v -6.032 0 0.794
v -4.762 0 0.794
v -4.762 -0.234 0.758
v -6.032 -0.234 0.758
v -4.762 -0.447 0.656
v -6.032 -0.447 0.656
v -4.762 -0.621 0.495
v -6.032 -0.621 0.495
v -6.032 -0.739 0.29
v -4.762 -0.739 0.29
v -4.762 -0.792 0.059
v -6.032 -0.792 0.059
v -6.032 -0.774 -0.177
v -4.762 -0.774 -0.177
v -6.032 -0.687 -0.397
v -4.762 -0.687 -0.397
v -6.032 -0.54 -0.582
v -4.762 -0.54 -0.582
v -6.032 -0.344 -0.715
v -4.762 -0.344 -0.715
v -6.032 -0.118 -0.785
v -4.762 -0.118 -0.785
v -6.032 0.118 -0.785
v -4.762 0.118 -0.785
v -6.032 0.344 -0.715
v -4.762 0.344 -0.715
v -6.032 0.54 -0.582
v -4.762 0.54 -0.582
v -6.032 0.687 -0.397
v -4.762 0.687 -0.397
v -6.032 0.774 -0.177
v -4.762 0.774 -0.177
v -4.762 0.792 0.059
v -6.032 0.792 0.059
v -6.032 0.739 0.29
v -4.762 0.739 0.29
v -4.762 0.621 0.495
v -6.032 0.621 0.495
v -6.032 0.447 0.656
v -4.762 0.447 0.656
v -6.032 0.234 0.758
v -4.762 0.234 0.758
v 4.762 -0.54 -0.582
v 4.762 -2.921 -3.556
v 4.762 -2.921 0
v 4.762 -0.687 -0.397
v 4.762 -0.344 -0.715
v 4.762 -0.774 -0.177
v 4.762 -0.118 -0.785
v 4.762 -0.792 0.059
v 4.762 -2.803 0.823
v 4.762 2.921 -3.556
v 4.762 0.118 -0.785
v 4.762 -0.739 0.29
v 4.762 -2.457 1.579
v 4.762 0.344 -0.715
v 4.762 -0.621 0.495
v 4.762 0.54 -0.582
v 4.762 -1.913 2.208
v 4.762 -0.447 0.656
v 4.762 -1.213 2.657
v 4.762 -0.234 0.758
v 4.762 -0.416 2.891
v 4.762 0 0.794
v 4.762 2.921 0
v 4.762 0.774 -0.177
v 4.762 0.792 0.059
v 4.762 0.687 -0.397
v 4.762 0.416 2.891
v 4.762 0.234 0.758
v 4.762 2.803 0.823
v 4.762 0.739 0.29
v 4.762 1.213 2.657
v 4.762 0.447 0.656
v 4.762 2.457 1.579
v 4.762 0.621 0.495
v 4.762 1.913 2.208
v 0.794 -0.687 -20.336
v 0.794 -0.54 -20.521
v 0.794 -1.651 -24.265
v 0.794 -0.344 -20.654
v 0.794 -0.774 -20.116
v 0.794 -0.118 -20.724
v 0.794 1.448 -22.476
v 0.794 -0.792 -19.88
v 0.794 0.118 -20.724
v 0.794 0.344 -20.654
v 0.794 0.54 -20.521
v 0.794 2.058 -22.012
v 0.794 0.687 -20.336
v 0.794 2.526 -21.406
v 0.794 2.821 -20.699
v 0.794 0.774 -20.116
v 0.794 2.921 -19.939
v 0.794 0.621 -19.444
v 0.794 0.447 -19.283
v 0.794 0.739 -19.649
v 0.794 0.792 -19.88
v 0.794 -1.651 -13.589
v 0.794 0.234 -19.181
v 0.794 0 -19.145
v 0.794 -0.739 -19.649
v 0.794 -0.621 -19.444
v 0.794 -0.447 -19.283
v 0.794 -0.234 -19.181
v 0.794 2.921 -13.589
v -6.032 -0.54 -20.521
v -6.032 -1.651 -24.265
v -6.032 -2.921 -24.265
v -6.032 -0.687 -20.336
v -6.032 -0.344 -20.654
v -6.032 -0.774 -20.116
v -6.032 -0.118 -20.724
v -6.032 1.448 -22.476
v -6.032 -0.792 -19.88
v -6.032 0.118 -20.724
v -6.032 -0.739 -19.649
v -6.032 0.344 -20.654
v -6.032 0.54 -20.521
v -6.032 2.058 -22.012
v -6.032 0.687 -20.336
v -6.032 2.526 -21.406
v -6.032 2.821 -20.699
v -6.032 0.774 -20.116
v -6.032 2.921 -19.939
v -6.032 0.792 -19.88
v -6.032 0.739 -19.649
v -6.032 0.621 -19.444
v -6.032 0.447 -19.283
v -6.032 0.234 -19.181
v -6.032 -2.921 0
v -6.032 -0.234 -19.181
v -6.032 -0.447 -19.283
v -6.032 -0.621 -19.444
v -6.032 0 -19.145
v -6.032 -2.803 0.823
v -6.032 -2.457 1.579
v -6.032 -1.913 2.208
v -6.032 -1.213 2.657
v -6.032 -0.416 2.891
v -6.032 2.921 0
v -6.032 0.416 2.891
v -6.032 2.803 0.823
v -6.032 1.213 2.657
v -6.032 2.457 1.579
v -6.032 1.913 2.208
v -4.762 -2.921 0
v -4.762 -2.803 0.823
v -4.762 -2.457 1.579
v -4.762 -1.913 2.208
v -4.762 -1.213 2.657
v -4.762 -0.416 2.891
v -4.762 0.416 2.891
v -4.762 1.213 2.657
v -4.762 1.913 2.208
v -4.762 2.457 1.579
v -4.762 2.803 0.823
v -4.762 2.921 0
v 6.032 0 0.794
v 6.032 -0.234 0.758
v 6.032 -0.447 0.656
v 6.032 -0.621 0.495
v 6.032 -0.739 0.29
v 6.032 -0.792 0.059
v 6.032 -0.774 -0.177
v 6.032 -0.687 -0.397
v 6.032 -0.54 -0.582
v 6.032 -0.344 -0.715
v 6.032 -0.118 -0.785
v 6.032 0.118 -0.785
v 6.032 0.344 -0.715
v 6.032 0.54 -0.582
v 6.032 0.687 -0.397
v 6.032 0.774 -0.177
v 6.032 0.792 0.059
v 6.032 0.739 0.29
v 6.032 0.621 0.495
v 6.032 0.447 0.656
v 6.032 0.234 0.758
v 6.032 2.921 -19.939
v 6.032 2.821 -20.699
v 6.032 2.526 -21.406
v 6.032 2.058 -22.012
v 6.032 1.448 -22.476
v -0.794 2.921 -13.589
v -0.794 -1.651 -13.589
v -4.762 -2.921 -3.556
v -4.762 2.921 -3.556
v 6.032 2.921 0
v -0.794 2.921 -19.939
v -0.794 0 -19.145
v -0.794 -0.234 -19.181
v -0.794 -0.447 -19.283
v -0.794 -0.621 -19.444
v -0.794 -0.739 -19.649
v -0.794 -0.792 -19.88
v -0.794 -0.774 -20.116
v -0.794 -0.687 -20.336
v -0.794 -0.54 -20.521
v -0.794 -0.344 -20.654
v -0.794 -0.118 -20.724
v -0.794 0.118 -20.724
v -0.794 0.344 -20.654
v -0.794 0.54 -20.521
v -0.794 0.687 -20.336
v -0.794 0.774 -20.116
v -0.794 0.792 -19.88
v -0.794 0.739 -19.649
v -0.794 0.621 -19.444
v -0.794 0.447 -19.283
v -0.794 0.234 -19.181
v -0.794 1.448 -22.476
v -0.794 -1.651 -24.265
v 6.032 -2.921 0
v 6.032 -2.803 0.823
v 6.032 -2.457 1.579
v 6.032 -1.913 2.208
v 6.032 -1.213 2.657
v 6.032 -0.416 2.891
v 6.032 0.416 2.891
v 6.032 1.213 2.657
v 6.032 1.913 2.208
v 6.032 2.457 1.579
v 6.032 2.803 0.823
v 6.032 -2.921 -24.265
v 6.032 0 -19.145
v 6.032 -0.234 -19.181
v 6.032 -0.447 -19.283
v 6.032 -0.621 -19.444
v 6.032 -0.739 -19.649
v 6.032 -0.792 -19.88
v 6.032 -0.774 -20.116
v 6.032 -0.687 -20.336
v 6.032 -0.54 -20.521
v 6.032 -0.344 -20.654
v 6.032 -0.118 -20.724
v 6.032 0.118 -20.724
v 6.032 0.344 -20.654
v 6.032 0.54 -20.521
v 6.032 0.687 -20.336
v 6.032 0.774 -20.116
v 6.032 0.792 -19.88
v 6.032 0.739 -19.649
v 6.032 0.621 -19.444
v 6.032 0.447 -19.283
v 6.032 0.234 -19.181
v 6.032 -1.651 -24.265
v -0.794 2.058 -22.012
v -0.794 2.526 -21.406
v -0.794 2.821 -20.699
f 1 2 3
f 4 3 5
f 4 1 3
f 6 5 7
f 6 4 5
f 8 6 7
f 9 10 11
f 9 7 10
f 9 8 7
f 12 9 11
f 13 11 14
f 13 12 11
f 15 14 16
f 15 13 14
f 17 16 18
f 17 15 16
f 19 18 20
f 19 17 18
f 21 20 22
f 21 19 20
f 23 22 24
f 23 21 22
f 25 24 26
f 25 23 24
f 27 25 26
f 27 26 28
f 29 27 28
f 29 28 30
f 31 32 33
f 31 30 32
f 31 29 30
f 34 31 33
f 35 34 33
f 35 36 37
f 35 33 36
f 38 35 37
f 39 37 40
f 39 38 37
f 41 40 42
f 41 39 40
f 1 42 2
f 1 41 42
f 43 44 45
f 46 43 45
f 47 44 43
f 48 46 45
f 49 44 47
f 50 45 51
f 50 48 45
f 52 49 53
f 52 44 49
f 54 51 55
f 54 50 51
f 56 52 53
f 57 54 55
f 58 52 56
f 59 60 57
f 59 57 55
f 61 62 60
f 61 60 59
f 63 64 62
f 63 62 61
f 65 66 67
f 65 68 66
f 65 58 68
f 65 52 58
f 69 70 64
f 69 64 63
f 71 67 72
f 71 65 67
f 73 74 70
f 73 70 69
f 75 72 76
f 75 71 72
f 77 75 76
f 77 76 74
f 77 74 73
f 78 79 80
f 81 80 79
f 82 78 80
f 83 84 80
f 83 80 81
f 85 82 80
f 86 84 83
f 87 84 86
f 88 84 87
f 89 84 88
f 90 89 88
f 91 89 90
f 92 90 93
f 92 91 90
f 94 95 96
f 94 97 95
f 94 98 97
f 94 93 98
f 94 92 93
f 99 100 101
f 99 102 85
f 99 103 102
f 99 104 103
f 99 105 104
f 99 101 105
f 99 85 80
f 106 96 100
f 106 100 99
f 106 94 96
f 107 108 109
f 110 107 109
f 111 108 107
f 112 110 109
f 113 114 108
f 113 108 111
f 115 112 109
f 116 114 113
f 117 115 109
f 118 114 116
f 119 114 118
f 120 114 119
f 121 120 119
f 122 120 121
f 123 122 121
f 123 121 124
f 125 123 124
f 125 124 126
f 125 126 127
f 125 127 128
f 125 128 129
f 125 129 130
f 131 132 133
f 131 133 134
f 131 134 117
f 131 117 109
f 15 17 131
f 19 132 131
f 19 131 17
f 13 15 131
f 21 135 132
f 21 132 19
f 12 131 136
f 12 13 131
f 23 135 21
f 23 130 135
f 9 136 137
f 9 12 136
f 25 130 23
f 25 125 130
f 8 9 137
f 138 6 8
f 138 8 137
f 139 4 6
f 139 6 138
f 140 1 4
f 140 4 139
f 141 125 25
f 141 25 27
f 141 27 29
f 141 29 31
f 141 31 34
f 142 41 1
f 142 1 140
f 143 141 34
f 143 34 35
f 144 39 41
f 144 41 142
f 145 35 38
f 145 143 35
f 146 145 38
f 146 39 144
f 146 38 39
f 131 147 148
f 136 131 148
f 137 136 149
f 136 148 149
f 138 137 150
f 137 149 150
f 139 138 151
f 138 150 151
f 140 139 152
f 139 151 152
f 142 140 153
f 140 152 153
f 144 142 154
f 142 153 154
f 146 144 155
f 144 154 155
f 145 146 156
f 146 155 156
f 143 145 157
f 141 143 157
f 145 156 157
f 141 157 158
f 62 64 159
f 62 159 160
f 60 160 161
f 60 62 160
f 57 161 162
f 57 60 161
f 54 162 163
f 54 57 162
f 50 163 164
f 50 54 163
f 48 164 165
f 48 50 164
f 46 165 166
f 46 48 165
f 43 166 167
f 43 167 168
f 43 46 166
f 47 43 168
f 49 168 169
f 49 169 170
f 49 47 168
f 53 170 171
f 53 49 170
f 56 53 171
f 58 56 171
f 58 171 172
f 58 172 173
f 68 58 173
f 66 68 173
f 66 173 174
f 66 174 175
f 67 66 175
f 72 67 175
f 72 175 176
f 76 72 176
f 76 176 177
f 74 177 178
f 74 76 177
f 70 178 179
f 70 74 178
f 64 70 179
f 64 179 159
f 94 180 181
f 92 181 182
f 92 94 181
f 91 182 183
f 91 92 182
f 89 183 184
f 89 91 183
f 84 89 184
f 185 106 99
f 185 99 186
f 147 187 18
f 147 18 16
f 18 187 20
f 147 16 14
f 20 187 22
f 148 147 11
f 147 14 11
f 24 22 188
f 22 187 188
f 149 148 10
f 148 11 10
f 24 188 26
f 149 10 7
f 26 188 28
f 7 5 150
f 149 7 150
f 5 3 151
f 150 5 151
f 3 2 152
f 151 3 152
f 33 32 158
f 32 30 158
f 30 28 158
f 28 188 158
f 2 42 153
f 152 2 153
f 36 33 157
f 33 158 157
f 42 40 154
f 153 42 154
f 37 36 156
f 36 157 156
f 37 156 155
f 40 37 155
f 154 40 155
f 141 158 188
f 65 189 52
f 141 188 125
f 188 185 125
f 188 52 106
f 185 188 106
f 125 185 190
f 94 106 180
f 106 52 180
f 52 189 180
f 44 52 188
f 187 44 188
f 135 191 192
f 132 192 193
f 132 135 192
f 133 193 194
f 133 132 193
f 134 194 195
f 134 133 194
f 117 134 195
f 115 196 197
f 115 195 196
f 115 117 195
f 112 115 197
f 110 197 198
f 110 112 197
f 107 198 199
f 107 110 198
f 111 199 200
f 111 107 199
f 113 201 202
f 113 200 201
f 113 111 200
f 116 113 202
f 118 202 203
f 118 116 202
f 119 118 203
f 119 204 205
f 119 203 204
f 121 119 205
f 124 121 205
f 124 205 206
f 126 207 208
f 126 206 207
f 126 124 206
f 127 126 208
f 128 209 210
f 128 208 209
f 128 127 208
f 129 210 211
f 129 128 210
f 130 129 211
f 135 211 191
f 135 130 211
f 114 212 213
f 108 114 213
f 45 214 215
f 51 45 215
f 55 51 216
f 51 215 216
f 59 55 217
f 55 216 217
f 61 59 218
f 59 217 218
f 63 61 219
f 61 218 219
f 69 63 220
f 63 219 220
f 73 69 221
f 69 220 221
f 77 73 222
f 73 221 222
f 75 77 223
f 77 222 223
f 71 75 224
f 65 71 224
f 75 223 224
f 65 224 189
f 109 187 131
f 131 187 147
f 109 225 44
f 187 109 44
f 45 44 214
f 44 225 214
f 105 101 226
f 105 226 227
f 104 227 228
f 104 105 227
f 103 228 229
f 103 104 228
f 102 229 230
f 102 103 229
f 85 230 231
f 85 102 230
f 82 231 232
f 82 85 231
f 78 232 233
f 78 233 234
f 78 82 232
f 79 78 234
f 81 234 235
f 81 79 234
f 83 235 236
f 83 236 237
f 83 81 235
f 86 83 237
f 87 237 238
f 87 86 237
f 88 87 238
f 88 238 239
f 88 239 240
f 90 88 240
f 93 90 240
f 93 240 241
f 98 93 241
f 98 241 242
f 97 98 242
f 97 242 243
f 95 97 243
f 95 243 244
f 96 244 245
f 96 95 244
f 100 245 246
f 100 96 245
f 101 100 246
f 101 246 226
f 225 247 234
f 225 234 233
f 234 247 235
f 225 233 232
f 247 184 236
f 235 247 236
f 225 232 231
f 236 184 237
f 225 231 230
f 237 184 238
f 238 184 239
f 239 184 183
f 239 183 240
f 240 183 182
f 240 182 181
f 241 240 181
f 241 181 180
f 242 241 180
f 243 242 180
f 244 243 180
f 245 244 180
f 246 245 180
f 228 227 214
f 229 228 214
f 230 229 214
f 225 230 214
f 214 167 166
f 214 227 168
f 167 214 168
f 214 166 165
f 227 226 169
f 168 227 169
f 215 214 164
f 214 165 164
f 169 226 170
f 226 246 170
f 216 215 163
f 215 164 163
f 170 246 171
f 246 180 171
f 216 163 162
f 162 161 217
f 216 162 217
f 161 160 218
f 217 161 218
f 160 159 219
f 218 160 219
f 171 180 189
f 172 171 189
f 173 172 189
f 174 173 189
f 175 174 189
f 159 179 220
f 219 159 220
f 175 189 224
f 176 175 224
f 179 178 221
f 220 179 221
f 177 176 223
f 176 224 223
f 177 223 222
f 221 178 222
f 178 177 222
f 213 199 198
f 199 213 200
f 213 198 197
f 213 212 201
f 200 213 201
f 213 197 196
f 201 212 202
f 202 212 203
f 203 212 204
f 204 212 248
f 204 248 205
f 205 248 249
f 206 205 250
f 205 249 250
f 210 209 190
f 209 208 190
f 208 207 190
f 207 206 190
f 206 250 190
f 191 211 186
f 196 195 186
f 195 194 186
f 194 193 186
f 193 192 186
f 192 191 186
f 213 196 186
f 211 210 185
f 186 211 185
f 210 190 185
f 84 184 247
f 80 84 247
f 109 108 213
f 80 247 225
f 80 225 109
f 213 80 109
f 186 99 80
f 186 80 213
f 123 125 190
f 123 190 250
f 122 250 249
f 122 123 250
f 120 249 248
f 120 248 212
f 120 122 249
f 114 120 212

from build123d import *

# Parameters (mm, degrees)
SKETCH1_R          = 0.79375
EXTRUDE1_DEPTH     = 6.0325
SKETCH2_W          = 9.525
SKETCH2_H          = 6.477
CUT_EXTRUDE1_DEPTH = 25.353636695
FILLET1_R          = 2.921
EXTRUDE2_DEPTH     = 12.065
SKETCH5_W          = 1.5875
SKETCH5_H          = 10.676085567
CUT_EXTRUDE2_DEPTH = 4.572


with BuildPart() as part:
    # Sketch1 → Extrude1 (new, symmetric)
    with BuildSketch(Plane(origin=(0, 0, 0), x_dir=(0, 0, -1), z_dir=(1, 0, 0))):
        with BuildLine():
            Line((0, 2.921), (22.86, 2.921))
            Line((22.86, 2.921), (22.86, -2.921))
            Line((22.86, -2.921), (0, -2.921))
            ThreePointArc((0, -2.921), (-2.921, 0), (0, 2.921))
        make_face()
        with Locations(Location((0, 0, 0), (0, 0, 180))):
            Circle(SKETCH1_R, mode=Mode.SUBTRACT)
        with Locations(Location((19.939, 0, 0), (0, 0, 180))):
            Circle(SKETCH1_R, mode=Mode.SUBTRACT)
    extrude(amount=EXTRUDE1_DEPTH, both=True)

    # Sketch2 → Cut-Extrude1 (cut, through all)
    with BuildSketch(Plane(origin=(0, 2.921, 0), x_dir=(-1, 0, 0), z_dir=(0, 1, 0))):
        with Locations((0, -0.3175)):
            Rectangle(SKETCH2_W, SKETCH2_H)
    extrude(amount=-CUT_EXTRUDE1_DEPTH, mode=Mode.SUBTRACT)

    # Fillet1
    fillet1_edges = [part.edges().sort_by_distance(p)[0] for p in [
        (0, 2.921, -22.86),
        (0, -2.921, -22.86),
    ]]
    fillet(fillet1_edges, radius=FILLET1_R - 0.0001)  # a hair under: the kernel refuses the full size

    # Sketch3 → Extrude2 (add)
    with BuildSketch(Plane(origin=(6.0325, 0, 0), x_dir=(0, 0, -1), z_dir=(1, 0, 0))):
        with BuildLine():
            Line((22.468660204, 1.4605), (24.265085567, -1.651))
            Line((24.265085567, -1.651), (24.265085567, -2.921))
            Line((24.265085567, -2.921), (19.939, -2.921))
            ThreePointArc((19.939, -2.921), (22.004458908, -2.065458908), (22.86, 0))
            ThreePointArc((22.86, 0), (22.760469339, 0.756010431), (22.468660204, 1.4605))
        make_face()
    extrude(amount=-EXTRUDE2_DEPTH)

    # Sketch5 → Cut-Extrude2 (cut)
    with BuildSketch(Plane(origin=(0, 2.921, 0), x_dir=(-1, 0, 0), z_dir=(0, 1, 0))):
        with Locations((0, -18.927042783)):
            Rectangle(SKETCH5_W, SKETCH5_H)
    extrude(amount=-CUT_EXTRUDE2_DEPTH, mode=Mode.SUBTRACT)


solid = part.part
